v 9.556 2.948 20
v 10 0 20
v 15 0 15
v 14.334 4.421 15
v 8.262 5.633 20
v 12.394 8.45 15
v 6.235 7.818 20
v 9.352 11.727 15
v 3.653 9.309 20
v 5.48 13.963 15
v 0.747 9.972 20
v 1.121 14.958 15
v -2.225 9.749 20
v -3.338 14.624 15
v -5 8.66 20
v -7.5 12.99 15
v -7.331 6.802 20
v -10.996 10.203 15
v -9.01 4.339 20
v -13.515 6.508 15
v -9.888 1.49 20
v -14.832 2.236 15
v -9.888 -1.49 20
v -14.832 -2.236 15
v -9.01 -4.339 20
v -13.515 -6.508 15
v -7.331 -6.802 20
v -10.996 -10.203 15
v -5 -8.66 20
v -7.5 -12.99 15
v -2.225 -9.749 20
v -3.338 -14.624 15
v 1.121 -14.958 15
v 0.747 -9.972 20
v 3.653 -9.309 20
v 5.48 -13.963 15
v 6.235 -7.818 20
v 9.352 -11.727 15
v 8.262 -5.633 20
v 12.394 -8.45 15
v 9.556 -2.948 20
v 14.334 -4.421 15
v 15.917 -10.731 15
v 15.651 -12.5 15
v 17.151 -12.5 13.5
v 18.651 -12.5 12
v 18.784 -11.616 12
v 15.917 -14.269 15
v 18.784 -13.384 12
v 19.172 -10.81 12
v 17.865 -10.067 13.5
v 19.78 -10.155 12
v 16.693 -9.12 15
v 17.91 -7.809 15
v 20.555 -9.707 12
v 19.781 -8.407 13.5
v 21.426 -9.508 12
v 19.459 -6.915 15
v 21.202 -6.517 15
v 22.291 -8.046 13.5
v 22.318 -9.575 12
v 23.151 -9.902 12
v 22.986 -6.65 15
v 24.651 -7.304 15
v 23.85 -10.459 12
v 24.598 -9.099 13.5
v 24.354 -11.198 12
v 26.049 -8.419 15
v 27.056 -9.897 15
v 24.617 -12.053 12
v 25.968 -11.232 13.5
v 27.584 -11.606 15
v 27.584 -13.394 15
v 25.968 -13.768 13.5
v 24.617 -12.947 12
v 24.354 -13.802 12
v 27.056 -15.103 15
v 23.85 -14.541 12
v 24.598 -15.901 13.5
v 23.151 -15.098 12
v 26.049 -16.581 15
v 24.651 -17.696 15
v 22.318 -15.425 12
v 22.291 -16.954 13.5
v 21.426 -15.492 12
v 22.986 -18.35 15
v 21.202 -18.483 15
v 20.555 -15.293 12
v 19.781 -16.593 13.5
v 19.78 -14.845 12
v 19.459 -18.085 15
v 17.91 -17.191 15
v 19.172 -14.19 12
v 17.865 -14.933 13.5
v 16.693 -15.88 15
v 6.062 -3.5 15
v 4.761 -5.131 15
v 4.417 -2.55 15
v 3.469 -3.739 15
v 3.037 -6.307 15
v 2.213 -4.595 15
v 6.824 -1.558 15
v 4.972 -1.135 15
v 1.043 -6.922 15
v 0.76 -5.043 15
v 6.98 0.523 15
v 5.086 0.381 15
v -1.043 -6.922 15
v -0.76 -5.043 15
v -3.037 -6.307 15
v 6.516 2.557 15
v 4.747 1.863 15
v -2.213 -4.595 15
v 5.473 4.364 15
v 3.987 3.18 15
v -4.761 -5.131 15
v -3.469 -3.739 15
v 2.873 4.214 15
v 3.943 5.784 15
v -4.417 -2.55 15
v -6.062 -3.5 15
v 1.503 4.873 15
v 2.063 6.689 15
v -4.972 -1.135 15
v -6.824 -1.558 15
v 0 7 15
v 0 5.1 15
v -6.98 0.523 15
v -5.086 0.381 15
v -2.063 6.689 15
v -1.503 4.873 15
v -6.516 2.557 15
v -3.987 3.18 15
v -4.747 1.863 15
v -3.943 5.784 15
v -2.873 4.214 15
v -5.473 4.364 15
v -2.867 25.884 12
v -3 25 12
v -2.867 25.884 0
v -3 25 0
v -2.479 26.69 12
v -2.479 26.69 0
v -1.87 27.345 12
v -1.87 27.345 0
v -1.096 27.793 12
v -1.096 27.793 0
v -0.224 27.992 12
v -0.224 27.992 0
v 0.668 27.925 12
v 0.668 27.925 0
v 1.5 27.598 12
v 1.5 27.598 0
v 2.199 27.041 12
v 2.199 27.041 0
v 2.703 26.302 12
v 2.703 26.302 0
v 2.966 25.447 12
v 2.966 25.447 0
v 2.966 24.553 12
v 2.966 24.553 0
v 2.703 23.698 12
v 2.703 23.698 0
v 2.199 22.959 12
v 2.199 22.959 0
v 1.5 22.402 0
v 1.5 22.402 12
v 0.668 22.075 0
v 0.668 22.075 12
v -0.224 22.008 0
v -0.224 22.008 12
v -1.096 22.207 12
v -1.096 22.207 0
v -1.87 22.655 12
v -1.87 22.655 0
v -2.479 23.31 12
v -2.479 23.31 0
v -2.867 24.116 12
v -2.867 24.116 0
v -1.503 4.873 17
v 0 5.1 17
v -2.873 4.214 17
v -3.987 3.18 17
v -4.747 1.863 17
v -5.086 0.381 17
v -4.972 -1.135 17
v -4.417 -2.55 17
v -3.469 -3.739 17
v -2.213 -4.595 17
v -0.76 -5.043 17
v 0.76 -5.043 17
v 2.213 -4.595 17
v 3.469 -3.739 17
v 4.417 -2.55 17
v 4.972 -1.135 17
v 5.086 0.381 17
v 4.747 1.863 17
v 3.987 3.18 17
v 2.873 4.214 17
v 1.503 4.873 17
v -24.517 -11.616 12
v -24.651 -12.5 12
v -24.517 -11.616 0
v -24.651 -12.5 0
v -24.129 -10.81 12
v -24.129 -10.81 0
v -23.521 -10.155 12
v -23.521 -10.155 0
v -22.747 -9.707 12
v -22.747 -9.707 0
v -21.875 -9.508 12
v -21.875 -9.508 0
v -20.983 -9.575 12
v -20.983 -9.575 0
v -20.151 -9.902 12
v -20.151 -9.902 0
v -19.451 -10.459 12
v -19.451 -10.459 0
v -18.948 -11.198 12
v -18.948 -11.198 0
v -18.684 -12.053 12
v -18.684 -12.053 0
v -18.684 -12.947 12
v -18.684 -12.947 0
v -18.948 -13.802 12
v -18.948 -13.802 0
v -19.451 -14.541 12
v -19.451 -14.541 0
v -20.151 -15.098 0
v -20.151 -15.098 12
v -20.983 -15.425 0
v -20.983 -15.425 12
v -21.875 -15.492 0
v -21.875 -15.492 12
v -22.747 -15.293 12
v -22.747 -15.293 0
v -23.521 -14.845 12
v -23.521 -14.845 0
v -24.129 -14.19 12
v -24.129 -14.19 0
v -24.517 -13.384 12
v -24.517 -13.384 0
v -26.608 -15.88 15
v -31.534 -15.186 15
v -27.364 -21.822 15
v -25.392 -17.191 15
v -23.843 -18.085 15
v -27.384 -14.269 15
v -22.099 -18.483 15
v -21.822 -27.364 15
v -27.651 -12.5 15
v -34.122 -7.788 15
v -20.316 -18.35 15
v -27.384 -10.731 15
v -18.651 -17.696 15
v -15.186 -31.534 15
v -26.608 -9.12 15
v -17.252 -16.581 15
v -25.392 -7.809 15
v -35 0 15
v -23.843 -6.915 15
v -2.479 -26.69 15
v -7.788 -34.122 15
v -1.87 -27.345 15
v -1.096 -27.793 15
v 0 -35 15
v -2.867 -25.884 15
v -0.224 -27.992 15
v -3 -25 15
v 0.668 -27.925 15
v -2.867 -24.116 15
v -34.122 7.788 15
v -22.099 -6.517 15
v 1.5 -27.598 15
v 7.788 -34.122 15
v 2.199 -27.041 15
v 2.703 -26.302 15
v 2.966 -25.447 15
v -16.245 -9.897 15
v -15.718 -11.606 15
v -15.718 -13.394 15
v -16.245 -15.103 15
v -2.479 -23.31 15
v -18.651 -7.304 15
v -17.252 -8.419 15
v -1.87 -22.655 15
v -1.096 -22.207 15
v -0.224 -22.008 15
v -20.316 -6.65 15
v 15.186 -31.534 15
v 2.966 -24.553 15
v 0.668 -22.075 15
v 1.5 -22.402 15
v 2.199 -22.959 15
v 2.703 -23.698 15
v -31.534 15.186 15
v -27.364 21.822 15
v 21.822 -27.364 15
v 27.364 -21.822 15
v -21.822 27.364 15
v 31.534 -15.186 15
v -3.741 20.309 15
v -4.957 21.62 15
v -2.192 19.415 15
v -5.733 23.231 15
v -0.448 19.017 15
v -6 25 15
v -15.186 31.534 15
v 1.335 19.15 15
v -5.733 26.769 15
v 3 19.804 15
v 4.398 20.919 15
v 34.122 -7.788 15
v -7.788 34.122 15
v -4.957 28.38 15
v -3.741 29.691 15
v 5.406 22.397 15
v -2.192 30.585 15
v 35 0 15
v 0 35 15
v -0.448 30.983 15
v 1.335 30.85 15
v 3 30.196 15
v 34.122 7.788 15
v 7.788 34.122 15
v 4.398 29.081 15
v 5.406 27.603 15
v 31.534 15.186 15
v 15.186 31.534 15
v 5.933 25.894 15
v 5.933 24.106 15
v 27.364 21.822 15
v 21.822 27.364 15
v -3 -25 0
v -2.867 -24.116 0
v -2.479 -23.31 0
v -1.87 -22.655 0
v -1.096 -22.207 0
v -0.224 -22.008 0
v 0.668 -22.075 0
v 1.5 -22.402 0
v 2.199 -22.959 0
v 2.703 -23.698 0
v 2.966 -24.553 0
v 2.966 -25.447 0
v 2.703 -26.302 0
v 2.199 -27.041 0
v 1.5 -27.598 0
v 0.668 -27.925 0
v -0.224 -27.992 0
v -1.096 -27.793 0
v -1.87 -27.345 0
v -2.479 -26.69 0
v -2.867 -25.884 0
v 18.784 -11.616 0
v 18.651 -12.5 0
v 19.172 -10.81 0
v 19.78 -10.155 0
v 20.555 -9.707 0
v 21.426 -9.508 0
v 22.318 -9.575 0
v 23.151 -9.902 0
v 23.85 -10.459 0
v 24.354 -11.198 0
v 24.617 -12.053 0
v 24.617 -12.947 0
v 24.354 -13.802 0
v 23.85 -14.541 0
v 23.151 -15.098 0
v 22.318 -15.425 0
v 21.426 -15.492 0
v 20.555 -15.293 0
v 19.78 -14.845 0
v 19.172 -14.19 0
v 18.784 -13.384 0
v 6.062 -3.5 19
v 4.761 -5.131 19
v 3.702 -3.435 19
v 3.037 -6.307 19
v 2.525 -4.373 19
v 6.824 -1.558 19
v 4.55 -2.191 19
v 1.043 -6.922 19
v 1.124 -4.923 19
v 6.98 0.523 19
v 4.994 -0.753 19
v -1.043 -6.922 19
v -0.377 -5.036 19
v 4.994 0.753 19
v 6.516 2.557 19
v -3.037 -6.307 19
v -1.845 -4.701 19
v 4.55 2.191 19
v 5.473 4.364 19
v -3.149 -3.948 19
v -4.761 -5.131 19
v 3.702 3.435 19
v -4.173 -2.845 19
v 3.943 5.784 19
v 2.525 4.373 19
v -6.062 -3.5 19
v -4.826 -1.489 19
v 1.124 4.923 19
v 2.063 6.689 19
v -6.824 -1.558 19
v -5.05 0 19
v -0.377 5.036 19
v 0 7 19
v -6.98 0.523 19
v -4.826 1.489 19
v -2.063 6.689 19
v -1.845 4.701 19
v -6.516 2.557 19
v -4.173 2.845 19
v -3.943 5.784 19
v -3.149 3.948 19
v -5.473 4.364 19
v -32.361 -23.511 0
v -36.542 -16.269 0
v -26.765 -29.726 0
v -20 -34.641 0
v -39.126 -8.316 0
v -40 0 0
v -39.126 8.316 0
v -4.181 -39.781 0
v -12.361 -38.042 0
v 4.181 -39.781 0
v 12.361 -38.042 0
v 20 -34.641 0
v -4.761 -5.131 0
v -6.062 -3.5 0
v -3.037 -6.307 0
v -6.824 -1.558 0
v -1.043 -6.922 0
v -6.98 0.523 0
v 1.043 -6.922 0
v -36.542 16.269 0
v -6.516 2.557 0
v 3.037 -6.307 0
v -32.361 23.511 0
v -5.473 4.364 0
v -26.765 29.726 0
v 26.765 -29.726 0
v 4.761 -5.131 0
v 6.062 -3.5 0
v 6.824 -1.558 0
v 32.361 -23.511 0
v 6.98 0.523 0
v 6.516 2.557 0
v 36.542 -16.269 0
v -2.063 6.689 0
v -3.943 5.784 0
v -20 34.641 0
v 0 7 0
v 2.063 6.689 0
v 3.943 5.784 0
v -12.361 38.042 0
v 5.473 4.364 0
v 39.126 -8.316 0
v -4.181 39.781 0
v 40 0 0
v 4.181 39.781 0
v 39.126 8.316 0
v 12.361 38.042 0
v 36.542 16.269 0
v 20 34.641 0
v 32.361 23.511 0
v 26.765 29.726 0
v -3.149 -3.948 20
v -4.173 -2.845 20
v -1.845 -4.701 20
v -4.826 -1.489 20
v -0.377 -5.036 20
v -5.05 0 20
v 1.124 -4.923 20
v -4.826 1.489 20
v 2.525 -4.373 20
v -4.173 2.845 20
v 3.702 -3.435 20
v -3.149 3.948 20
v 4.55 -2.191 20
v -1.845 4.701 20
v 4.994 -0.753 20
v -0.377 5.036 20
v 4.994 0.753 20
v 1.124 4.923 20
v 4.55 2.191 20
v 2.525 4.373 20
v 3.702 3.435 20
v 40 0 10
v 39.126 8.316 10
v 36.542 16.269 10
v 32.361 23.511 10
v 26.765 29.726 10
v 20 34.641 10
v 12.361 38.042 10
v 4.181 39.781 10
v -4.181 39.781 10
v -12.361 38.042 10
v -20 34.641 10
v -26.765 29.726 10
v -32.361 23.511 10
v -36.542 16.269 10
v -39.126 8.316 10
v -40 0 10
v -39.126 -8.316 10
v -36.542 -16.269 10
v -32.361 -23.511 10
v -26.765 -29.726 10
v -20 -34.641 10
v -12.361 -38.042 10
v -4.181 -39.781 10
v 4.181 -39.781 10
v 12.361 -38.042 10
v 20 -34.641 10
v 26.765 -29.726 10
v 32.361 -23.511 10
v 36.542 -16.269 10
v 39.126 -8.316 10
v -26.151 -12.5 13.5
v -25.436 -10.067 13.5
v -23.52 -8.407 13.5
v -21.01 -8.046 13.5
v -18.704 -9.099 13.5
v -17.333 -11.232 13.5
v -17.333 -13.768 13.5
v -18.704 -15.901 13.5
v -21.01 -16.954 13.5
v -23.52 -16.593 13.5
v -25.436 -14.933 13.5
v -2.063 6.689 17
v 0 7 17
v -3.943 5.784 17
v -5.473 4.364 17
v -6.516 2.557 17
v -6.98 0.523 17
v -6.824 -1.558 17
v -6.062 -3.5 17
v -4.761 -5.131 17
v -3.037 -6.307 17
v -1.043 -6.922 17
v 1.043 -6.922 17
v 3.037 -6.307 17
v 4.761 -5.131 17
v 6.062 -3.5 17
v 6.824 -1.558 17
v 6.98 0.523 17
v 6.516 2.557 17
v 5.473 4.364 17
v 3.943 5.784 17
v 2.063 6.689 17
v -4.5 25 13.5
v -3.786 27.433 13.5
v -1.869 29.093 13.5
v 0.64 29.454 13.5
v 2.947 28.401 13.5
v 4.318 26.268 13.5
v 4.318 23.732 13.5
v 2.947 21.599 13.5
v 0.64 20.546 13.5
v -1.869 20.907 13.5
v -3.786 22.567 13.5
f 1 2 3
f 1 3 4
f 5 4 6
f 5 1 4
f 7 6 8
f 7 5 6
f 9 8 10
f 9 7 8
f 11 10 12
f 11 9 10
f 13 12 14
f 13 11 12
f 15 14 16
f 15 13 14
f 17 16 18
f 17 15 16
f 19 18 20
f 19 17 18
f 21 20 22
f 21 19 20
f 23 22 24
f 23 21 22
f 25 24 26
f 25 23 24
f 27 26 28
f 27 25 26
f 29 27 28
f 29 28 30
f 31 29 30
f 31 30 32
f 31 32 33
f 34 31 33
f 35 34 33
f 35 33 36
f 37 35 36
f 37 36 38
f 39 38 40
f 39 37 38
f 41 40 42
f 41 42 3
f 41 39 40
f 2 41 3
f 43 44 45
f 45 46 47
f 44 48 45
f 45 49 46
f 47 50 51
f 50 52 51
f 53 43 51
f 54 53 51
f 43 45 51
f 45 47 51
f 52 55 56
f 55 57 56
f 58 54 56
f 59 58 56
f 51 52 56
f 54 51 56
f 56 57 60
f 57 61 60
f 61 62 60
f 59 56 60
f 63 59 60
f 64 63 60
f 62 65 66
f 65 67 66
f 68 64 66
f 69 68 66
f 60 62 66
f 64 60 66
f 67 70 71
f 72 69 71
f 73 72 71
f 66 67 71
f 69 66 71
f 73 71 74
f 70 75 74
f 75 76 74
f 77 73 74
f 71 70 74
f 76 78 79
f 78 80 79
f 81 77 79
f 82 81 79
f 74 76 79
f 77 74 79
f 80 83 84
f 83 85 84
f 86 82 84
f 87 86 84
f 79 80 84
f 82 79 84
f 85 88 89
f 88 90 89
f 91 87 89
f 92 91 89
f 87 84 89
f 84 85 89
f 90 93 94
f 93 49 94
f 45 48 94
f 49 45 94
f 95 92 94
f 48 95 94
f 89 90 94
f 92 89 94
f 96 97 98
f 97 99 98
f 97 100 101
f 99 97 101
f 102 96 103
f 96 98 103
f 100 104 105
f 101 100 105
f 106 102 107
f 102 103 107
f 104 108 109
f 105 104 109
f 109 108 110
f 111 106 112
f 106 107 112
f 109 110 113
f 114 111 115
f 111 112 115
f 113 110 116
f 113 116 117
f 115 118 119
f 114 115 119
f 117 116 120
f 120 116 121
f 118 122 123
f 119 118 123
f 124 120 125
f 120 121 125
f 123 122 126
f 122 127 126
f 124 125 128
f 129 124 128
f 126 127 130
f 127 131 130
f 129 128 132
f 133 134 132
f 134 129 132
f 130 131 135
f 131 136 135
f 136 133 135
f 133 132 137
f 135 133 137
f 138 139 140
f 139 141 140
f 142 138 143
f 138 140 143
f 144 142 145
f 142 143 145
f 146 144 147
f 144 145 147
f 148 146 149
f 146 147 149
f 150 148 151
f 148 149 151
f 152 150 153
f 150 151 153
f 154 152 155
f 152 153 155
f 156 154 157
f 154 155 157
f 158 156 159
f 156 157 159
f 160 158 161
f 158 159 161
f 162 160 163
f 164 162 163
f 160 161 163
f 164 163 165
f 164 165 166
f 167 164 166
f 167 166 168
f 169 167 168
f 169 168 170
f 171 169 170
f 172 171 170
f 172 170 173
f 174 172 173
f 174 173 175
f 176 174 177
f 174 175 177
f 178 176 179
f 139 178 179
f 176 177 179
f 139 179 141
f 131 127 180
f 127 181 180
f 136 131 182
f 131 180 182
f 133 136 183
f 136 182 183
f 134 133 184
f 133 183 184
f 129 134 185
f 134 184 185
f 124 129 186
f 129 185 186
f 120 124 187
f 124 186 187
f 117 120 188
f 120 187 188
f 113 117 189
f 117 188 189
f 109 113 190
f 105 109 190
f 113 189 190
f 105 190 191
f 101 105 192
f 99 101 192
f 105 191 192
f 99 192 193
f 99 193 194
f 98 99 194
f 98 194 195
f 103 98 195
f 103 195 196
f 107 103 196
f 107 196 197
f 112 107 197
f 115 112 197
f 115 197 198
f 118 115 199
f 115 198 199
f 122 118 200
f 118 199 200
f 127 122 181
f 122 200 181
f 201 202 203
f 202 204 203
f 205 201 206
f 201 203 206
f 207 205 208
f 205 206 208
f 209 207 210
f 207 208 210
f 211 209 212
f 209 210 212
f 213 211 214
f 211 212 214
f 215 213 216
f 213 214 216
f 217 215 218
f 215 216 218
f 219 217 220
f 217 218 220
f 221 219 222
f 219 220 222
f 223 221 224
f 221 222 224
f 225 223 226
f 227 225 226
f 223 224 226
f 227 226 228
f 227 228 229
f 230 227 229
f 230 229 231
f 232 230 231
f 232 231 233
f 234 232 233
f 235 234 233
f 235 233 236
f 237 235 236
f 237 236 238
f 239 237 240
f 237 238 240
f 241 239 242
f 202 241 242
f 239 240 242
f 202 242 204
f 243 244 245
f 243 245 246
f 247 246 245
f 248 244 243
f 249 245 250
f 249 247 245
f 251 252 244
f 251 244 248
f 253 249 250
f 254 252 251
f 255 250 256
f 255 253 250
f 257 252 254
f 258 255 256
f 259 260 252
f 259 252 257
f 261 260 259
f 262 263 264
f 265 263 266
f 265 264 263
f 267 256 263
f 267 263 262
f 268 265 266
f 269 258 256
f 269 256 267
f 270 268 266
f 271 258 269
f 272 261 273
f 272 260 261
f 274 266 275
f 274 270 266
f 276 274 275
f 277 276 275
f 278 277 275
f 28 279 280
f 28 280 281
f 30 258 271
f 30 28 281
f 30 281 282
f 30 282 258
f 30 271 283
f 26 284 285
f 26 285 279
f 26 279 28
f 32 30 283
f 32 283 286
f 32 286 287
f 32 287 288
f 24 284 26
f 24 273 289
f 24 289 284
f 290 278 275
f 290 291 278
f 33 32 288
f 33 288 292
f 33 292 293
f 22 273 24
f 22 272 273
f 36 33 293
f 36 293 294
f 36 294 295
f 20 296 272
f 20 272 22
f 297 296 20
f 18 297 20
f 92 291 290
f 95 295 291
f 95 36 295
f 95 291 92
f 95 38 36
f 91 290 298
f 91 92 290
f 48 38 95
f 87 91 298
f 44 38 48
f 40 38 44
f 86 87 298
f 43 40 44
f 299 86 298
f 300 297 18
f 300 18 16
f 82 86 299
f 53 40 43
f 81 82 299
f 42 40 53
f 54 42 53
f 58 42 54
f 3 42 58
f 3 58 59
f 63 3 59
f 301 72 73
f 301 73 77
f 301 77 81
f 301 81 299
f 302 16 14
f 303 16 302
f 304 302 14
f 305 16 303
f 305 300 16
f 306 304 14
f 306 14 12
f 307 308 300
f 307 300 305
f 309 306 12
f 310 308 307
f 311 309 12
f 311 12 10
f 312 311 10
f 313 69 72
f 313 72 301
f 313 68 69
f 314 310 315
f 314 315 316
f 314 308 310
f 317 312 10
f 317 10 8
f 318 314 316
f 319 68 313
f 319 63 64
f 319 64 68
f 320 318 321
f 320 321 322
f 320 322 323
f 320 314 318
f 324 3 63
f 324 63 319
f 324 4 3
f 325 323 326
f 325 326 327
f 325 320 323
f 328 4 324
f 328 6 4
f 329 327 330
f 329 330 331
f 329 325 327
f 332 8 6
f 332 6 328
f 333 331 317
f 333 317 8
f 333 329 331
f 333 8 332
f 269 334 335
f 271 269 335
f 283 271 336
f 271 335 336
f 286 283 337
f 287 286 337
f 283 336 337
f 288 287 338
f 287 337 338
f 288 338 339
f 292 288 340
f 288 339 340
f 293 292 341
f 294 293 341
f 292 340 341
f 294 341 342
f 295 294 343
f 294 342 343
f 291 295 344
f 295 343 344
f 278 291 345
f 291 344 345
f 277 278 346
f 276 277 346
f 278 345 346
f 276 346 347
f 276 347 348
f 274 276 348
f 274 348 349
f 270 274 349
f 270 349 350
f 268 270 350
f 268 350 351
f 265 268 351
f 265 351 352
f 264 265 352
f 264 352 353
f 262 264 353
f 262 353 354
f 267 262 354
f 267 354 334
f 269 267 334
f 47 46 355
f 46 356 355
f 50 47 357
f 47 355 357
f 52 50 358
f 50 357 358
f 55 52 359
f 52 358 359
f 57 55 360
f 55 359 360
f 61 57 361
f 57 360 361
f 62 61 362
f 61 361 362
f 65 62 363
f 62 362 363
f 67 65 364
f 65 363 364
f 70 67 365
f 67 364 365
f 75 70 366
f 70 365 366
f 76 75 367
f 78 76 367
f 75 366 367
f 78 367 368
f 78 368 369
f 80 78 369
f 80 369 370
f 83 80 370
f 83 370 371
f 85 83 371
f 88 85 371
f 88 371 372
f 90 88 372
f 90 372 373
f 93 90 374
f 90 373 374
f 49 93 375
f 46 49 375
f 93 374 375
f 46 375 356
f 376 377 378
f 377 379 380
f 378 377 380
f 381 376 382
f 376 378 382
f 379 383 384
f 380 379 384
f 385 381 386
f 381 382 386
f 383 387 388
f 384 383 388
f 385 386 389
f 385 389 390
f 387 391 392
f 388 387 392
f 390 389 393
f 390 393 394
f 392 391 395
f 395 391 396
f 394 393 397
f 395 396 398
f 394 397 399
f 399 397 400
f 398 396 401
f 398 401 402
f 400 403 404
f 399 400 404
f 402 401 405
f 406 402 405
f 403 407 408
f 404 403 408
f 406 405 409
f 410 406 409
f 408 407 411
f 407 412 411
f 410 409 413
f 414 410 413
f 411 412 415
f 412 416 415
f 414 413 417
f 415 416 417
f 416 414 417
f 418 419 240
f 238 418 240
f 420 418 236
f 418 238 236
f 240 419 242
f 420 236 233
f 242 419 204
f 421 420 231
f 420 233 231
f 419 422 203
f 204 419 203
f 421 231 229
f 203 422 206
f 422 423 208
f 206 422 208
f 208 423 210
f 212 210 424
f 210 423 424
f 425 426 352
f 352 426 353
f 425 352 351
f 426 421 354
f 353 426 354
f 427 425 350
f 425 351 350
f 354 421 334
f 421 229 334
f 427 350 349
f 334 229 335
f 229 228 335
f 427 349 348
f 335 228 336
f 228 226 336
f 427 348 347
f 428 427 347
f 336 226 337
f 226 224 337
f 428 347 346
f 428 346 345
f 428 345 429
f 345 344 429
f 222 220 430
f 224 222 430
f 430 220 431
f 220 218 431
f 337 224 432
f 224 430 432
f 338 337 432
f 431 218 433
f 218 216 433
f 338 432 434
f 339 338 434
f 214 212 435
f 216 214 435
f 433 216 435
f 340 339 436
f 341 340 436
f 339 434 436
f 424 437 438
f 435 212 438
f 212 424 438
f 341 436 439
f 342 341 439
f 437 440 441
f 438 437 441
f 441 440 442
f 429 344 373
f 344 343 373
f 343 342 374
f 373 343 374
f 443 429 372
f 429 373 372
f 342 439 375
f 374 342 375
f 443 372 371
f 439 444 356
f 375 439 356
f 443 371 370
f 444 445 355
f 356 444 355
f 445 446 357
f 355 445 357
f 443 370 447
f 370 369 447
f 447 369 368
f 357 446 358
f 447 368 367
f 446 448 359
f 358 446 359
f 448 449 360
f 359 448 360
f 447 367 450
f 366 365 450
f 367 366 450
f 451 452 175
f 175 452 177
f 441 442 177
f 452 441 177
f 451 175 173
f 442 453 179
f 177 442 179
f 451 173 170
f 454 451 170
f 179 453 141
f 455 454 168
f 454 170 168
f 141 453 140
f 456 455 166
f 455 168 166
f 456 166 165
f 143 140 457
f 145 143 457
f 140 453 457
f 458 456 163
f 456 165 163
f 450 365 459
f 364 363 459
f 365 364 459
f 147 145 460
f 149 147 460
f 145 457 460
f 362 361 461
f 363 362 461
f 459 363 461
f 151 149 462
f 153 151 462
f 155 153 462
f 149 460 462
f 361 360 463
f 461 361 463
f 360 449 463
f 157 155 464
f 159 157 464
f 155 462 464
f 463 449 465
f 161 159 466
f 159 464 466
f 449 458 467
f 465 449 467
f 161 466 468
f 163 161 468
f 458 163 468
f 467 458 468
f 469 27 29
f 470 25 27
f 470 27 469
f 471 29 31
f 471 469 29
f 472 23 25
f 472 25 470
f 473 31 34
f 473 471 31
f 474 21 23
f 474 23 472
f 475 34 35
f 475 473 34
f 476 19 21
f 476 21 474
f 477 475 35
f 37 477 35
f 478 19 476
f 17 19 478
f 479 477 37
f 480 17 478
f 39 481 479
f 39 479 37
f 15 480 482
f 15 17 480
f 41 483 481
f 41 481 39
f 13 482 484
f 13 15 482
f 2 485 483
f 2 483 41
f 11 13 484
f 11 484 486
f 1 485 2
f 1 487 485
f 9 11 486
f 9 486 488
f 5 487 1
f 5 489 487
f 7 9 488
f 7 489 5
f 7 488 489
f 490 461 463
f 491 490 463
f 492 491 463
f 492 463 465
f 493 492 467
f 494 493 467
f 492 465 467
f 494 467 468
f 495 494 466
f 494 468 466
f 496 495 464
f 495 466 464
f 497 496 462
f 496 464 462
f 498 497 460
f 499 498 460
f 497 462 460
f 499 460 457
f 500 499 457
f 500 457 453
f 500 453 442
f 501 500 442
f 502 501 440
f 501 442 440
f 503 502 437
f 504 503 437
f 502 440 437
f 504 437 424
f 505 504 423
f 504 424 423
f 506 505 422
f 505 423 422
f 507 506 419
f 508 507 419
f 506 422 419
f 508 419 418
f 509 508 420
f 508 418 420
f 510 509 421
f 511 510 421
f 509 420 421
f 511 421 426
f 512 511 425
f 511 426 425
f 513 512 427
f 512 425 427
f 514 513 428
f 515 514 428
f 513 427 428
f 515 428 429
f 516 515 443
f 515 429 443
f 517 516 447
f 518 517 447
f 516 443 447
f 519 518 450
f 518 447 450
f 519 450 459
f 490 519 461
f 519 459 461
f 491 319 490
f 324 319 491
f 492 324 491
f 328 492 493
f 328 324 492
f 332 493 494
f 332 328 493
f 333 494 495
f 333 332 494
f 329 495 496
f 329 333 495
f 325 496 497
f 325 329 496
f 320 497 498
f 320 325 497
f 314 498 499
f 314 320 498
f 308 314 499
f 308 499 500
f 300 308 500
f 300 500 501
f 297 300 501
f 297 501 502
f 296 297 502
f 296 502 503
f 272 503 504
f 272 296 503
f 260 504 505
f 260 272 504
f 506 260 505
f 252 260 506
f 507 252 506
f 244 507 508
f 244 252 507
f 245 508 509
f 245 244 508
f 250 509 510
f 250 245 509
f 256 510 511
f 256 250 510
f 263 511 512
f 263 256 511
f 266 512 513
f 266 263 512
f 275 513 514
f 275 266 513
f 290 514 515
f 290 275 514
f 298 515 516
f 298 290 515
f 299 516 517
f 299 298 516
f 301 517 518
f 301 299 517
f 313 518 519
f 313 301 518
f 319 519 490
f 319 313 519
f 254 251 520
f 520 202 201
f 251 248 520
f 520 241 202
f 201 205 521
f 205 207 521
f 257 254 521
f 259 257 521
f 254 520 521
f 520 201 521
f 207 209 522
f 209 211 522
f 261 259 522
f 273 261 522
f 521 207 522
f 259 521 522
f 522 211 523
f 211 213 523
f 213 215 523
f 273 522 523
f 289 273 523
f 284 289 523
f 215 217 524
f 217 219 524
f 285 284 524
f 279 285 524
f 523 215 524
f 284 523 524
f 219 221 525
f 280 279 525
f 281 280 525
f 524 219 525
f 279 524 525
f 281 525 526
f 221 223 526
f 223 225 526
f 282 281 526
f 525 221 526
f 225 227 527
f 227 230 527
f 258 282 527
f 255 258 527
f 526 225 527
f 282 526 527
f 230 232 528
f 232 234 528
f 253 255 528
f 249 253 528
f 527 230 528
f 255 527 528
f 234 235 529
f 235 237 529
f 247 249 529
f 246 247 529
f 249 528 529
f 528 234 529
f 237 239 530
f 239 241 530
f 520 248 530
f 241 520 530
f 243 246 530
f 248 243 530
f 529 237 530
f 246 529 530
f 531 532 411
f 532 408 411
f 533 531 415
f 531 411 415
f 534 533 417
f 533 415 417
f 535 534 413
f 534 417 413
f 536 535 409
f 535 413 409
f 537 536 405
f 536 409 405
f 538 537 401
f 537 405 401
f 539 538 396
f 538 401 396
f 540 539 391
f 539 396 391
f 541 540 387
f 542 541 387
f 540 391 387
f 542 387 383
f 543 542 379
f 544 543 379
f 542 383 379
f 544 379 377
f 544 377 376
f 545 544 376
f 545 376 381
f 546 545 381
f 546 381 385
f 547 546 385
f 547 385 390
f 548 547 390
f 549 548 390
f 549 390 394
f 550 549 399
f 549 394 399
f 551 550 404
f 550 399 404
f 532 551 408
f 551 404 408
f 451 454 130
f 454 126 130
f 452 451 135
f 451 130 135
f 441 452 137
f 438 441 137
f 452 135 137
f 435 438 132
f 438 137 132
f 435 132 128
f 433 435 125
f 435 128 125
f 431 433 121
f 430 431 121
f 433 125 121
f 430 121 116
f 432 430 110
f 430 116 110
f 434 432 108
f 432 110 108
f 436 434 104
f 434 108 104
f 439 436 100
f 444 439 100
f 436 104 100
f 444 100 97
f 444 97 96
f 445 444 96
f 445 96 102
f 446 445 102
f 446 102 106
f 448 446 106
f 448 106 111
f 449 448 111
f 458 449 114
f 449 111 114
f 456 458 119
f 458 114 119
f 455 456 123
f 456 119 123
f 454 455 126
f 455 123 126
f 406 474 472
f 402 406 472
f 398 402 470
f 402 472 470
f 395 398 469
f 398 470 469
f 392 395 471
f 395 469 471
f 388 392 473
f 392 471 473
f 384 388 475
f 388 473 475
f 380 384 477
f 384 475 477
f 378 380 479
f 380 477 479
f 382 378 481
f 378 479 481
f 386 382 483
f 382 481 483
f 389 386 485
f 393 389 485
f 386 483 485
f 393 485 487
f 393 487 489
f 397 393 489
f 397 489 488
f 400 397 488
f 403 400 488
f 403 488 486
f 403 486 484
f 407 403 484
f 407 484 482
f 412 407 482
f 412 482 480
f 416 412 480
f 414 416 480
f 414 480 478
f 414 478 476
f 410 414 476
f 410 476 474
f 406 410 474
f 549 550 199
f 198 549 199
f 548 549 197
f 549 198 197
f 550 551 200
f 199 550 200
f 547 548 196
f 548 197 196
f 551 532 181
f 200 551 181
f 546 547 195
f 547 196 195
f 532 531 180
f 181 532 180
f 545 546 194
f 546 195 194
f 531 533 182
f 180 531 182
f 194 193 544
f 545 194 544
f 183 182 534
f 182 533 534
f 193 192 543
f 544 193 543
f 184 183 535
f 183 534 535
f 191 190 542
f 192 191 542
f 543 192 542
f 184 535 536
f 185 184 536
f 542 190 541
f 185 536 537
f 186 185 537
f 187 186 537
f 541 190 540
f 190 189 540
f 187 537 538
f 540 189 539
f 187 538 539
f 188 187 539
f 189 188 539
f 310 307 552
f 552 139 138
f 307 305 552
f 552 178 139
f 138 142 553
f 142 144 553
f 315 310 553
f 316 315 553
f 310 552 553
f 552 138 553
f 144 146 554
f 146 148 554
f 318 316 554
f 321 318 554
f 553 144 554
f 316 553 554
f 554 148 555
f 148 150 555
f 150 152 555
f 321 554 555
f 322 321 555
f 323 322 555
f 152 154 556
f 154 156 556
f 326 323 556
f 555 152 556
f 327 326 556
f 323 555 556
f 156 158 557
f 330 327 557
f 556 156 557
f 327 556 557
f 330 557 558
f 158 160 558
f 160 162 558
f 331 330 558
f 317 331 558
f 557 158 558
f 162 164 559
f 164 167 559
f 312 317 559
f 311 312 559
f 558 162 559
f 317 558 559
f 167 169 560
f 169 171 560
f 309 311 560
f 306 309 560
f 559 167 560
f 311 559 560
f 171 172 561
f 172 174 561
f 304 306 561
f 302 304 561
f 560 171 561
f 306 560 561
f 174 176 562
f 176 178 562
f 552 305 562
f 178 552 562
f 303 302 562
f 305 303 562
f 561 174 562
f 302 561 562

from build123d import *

# Parameters (mm, degrees)
F0_R           = 40
F1_DEPTH       = 15
F2_SIZE        = 5
F3_R           = 15
F4_DEPTH       = 5
F5_SIZE        = 4.99999
F7_D           = 6
F7_CSINK_D     = 12
F7_CSINK_ANGLE = 90
F8_D           = 10.1
F11_D          = 6


# Not quite as in the source:
# - a fillet or chamfer is up to 0.001 mm smaller than in the source, because OpenCascade refuses the exact size


with BuildPart() as f1:
    # F0 (on Top) → F1 (new body)
    with BuildSketch(Plane.XY):
        Circle(F0_R)
    extrude(amount=F1_DEPTH)

    # F2
    f2_edges = [f1.edges().sort_by_distance(p)[0] for p in [
        (-40, 0, 15),
    ]]
    chamfer(f2_edges, length=F2_SIZE)

    # F3 (on face) → F4 (join)
    with BuildSketch(Plane.XY.offset(15)):
        Circle(F3_R)
    extrude(amount=F4_DEPTH)

    # F5 (size 5 in the source; OpenCascade refuses exactly that, so slightly less here)
    f5_edges = [f1.edges().sort_by_distance(p)[0] for p in [
        (-15, 0, 20),
    ]]
    chamfer(f5_edges, length=F5_SIZE)

    # F7 (through all)
    with Locations(Plane.XY.offset(15)):
        with Locations((0, 25), (-21.6506350946, -12.5), (21.6506350946, -12.5)):
            CounterSinkHole(F7_D / 2, F7_CSINK_D / 2, counter_sink_angle=F7_CSINK_ANGLE)

    # F8 (through all)
    with Locations(Plane(origin=(0, 0, 0), x_dir=(1, 0, 0), z_dir=(0, 0, -1))):
        with Locations((0, 0)):
            Hole(F8_D / 2)

    # F9 (on Right) → F10 (revolve, cut)
    with BuildSketch(Plane.YZ):
        Polygon((7, 19), (0, 19), (0, 0), (7, 0), (7, 15), (5.1, 15), (5.1, 17), (7, 17), align=None)
    revolve(axis=Axis((0, 0, 9.5), (0, 0, 1)), mode=Mode.SUBTRACT)

    # F11 (through all)
    with Locations(Plane.XY.offset(15)):
        with Locations((0, -25)):
            Hole(F11_D / 2)


solid = f1.part
